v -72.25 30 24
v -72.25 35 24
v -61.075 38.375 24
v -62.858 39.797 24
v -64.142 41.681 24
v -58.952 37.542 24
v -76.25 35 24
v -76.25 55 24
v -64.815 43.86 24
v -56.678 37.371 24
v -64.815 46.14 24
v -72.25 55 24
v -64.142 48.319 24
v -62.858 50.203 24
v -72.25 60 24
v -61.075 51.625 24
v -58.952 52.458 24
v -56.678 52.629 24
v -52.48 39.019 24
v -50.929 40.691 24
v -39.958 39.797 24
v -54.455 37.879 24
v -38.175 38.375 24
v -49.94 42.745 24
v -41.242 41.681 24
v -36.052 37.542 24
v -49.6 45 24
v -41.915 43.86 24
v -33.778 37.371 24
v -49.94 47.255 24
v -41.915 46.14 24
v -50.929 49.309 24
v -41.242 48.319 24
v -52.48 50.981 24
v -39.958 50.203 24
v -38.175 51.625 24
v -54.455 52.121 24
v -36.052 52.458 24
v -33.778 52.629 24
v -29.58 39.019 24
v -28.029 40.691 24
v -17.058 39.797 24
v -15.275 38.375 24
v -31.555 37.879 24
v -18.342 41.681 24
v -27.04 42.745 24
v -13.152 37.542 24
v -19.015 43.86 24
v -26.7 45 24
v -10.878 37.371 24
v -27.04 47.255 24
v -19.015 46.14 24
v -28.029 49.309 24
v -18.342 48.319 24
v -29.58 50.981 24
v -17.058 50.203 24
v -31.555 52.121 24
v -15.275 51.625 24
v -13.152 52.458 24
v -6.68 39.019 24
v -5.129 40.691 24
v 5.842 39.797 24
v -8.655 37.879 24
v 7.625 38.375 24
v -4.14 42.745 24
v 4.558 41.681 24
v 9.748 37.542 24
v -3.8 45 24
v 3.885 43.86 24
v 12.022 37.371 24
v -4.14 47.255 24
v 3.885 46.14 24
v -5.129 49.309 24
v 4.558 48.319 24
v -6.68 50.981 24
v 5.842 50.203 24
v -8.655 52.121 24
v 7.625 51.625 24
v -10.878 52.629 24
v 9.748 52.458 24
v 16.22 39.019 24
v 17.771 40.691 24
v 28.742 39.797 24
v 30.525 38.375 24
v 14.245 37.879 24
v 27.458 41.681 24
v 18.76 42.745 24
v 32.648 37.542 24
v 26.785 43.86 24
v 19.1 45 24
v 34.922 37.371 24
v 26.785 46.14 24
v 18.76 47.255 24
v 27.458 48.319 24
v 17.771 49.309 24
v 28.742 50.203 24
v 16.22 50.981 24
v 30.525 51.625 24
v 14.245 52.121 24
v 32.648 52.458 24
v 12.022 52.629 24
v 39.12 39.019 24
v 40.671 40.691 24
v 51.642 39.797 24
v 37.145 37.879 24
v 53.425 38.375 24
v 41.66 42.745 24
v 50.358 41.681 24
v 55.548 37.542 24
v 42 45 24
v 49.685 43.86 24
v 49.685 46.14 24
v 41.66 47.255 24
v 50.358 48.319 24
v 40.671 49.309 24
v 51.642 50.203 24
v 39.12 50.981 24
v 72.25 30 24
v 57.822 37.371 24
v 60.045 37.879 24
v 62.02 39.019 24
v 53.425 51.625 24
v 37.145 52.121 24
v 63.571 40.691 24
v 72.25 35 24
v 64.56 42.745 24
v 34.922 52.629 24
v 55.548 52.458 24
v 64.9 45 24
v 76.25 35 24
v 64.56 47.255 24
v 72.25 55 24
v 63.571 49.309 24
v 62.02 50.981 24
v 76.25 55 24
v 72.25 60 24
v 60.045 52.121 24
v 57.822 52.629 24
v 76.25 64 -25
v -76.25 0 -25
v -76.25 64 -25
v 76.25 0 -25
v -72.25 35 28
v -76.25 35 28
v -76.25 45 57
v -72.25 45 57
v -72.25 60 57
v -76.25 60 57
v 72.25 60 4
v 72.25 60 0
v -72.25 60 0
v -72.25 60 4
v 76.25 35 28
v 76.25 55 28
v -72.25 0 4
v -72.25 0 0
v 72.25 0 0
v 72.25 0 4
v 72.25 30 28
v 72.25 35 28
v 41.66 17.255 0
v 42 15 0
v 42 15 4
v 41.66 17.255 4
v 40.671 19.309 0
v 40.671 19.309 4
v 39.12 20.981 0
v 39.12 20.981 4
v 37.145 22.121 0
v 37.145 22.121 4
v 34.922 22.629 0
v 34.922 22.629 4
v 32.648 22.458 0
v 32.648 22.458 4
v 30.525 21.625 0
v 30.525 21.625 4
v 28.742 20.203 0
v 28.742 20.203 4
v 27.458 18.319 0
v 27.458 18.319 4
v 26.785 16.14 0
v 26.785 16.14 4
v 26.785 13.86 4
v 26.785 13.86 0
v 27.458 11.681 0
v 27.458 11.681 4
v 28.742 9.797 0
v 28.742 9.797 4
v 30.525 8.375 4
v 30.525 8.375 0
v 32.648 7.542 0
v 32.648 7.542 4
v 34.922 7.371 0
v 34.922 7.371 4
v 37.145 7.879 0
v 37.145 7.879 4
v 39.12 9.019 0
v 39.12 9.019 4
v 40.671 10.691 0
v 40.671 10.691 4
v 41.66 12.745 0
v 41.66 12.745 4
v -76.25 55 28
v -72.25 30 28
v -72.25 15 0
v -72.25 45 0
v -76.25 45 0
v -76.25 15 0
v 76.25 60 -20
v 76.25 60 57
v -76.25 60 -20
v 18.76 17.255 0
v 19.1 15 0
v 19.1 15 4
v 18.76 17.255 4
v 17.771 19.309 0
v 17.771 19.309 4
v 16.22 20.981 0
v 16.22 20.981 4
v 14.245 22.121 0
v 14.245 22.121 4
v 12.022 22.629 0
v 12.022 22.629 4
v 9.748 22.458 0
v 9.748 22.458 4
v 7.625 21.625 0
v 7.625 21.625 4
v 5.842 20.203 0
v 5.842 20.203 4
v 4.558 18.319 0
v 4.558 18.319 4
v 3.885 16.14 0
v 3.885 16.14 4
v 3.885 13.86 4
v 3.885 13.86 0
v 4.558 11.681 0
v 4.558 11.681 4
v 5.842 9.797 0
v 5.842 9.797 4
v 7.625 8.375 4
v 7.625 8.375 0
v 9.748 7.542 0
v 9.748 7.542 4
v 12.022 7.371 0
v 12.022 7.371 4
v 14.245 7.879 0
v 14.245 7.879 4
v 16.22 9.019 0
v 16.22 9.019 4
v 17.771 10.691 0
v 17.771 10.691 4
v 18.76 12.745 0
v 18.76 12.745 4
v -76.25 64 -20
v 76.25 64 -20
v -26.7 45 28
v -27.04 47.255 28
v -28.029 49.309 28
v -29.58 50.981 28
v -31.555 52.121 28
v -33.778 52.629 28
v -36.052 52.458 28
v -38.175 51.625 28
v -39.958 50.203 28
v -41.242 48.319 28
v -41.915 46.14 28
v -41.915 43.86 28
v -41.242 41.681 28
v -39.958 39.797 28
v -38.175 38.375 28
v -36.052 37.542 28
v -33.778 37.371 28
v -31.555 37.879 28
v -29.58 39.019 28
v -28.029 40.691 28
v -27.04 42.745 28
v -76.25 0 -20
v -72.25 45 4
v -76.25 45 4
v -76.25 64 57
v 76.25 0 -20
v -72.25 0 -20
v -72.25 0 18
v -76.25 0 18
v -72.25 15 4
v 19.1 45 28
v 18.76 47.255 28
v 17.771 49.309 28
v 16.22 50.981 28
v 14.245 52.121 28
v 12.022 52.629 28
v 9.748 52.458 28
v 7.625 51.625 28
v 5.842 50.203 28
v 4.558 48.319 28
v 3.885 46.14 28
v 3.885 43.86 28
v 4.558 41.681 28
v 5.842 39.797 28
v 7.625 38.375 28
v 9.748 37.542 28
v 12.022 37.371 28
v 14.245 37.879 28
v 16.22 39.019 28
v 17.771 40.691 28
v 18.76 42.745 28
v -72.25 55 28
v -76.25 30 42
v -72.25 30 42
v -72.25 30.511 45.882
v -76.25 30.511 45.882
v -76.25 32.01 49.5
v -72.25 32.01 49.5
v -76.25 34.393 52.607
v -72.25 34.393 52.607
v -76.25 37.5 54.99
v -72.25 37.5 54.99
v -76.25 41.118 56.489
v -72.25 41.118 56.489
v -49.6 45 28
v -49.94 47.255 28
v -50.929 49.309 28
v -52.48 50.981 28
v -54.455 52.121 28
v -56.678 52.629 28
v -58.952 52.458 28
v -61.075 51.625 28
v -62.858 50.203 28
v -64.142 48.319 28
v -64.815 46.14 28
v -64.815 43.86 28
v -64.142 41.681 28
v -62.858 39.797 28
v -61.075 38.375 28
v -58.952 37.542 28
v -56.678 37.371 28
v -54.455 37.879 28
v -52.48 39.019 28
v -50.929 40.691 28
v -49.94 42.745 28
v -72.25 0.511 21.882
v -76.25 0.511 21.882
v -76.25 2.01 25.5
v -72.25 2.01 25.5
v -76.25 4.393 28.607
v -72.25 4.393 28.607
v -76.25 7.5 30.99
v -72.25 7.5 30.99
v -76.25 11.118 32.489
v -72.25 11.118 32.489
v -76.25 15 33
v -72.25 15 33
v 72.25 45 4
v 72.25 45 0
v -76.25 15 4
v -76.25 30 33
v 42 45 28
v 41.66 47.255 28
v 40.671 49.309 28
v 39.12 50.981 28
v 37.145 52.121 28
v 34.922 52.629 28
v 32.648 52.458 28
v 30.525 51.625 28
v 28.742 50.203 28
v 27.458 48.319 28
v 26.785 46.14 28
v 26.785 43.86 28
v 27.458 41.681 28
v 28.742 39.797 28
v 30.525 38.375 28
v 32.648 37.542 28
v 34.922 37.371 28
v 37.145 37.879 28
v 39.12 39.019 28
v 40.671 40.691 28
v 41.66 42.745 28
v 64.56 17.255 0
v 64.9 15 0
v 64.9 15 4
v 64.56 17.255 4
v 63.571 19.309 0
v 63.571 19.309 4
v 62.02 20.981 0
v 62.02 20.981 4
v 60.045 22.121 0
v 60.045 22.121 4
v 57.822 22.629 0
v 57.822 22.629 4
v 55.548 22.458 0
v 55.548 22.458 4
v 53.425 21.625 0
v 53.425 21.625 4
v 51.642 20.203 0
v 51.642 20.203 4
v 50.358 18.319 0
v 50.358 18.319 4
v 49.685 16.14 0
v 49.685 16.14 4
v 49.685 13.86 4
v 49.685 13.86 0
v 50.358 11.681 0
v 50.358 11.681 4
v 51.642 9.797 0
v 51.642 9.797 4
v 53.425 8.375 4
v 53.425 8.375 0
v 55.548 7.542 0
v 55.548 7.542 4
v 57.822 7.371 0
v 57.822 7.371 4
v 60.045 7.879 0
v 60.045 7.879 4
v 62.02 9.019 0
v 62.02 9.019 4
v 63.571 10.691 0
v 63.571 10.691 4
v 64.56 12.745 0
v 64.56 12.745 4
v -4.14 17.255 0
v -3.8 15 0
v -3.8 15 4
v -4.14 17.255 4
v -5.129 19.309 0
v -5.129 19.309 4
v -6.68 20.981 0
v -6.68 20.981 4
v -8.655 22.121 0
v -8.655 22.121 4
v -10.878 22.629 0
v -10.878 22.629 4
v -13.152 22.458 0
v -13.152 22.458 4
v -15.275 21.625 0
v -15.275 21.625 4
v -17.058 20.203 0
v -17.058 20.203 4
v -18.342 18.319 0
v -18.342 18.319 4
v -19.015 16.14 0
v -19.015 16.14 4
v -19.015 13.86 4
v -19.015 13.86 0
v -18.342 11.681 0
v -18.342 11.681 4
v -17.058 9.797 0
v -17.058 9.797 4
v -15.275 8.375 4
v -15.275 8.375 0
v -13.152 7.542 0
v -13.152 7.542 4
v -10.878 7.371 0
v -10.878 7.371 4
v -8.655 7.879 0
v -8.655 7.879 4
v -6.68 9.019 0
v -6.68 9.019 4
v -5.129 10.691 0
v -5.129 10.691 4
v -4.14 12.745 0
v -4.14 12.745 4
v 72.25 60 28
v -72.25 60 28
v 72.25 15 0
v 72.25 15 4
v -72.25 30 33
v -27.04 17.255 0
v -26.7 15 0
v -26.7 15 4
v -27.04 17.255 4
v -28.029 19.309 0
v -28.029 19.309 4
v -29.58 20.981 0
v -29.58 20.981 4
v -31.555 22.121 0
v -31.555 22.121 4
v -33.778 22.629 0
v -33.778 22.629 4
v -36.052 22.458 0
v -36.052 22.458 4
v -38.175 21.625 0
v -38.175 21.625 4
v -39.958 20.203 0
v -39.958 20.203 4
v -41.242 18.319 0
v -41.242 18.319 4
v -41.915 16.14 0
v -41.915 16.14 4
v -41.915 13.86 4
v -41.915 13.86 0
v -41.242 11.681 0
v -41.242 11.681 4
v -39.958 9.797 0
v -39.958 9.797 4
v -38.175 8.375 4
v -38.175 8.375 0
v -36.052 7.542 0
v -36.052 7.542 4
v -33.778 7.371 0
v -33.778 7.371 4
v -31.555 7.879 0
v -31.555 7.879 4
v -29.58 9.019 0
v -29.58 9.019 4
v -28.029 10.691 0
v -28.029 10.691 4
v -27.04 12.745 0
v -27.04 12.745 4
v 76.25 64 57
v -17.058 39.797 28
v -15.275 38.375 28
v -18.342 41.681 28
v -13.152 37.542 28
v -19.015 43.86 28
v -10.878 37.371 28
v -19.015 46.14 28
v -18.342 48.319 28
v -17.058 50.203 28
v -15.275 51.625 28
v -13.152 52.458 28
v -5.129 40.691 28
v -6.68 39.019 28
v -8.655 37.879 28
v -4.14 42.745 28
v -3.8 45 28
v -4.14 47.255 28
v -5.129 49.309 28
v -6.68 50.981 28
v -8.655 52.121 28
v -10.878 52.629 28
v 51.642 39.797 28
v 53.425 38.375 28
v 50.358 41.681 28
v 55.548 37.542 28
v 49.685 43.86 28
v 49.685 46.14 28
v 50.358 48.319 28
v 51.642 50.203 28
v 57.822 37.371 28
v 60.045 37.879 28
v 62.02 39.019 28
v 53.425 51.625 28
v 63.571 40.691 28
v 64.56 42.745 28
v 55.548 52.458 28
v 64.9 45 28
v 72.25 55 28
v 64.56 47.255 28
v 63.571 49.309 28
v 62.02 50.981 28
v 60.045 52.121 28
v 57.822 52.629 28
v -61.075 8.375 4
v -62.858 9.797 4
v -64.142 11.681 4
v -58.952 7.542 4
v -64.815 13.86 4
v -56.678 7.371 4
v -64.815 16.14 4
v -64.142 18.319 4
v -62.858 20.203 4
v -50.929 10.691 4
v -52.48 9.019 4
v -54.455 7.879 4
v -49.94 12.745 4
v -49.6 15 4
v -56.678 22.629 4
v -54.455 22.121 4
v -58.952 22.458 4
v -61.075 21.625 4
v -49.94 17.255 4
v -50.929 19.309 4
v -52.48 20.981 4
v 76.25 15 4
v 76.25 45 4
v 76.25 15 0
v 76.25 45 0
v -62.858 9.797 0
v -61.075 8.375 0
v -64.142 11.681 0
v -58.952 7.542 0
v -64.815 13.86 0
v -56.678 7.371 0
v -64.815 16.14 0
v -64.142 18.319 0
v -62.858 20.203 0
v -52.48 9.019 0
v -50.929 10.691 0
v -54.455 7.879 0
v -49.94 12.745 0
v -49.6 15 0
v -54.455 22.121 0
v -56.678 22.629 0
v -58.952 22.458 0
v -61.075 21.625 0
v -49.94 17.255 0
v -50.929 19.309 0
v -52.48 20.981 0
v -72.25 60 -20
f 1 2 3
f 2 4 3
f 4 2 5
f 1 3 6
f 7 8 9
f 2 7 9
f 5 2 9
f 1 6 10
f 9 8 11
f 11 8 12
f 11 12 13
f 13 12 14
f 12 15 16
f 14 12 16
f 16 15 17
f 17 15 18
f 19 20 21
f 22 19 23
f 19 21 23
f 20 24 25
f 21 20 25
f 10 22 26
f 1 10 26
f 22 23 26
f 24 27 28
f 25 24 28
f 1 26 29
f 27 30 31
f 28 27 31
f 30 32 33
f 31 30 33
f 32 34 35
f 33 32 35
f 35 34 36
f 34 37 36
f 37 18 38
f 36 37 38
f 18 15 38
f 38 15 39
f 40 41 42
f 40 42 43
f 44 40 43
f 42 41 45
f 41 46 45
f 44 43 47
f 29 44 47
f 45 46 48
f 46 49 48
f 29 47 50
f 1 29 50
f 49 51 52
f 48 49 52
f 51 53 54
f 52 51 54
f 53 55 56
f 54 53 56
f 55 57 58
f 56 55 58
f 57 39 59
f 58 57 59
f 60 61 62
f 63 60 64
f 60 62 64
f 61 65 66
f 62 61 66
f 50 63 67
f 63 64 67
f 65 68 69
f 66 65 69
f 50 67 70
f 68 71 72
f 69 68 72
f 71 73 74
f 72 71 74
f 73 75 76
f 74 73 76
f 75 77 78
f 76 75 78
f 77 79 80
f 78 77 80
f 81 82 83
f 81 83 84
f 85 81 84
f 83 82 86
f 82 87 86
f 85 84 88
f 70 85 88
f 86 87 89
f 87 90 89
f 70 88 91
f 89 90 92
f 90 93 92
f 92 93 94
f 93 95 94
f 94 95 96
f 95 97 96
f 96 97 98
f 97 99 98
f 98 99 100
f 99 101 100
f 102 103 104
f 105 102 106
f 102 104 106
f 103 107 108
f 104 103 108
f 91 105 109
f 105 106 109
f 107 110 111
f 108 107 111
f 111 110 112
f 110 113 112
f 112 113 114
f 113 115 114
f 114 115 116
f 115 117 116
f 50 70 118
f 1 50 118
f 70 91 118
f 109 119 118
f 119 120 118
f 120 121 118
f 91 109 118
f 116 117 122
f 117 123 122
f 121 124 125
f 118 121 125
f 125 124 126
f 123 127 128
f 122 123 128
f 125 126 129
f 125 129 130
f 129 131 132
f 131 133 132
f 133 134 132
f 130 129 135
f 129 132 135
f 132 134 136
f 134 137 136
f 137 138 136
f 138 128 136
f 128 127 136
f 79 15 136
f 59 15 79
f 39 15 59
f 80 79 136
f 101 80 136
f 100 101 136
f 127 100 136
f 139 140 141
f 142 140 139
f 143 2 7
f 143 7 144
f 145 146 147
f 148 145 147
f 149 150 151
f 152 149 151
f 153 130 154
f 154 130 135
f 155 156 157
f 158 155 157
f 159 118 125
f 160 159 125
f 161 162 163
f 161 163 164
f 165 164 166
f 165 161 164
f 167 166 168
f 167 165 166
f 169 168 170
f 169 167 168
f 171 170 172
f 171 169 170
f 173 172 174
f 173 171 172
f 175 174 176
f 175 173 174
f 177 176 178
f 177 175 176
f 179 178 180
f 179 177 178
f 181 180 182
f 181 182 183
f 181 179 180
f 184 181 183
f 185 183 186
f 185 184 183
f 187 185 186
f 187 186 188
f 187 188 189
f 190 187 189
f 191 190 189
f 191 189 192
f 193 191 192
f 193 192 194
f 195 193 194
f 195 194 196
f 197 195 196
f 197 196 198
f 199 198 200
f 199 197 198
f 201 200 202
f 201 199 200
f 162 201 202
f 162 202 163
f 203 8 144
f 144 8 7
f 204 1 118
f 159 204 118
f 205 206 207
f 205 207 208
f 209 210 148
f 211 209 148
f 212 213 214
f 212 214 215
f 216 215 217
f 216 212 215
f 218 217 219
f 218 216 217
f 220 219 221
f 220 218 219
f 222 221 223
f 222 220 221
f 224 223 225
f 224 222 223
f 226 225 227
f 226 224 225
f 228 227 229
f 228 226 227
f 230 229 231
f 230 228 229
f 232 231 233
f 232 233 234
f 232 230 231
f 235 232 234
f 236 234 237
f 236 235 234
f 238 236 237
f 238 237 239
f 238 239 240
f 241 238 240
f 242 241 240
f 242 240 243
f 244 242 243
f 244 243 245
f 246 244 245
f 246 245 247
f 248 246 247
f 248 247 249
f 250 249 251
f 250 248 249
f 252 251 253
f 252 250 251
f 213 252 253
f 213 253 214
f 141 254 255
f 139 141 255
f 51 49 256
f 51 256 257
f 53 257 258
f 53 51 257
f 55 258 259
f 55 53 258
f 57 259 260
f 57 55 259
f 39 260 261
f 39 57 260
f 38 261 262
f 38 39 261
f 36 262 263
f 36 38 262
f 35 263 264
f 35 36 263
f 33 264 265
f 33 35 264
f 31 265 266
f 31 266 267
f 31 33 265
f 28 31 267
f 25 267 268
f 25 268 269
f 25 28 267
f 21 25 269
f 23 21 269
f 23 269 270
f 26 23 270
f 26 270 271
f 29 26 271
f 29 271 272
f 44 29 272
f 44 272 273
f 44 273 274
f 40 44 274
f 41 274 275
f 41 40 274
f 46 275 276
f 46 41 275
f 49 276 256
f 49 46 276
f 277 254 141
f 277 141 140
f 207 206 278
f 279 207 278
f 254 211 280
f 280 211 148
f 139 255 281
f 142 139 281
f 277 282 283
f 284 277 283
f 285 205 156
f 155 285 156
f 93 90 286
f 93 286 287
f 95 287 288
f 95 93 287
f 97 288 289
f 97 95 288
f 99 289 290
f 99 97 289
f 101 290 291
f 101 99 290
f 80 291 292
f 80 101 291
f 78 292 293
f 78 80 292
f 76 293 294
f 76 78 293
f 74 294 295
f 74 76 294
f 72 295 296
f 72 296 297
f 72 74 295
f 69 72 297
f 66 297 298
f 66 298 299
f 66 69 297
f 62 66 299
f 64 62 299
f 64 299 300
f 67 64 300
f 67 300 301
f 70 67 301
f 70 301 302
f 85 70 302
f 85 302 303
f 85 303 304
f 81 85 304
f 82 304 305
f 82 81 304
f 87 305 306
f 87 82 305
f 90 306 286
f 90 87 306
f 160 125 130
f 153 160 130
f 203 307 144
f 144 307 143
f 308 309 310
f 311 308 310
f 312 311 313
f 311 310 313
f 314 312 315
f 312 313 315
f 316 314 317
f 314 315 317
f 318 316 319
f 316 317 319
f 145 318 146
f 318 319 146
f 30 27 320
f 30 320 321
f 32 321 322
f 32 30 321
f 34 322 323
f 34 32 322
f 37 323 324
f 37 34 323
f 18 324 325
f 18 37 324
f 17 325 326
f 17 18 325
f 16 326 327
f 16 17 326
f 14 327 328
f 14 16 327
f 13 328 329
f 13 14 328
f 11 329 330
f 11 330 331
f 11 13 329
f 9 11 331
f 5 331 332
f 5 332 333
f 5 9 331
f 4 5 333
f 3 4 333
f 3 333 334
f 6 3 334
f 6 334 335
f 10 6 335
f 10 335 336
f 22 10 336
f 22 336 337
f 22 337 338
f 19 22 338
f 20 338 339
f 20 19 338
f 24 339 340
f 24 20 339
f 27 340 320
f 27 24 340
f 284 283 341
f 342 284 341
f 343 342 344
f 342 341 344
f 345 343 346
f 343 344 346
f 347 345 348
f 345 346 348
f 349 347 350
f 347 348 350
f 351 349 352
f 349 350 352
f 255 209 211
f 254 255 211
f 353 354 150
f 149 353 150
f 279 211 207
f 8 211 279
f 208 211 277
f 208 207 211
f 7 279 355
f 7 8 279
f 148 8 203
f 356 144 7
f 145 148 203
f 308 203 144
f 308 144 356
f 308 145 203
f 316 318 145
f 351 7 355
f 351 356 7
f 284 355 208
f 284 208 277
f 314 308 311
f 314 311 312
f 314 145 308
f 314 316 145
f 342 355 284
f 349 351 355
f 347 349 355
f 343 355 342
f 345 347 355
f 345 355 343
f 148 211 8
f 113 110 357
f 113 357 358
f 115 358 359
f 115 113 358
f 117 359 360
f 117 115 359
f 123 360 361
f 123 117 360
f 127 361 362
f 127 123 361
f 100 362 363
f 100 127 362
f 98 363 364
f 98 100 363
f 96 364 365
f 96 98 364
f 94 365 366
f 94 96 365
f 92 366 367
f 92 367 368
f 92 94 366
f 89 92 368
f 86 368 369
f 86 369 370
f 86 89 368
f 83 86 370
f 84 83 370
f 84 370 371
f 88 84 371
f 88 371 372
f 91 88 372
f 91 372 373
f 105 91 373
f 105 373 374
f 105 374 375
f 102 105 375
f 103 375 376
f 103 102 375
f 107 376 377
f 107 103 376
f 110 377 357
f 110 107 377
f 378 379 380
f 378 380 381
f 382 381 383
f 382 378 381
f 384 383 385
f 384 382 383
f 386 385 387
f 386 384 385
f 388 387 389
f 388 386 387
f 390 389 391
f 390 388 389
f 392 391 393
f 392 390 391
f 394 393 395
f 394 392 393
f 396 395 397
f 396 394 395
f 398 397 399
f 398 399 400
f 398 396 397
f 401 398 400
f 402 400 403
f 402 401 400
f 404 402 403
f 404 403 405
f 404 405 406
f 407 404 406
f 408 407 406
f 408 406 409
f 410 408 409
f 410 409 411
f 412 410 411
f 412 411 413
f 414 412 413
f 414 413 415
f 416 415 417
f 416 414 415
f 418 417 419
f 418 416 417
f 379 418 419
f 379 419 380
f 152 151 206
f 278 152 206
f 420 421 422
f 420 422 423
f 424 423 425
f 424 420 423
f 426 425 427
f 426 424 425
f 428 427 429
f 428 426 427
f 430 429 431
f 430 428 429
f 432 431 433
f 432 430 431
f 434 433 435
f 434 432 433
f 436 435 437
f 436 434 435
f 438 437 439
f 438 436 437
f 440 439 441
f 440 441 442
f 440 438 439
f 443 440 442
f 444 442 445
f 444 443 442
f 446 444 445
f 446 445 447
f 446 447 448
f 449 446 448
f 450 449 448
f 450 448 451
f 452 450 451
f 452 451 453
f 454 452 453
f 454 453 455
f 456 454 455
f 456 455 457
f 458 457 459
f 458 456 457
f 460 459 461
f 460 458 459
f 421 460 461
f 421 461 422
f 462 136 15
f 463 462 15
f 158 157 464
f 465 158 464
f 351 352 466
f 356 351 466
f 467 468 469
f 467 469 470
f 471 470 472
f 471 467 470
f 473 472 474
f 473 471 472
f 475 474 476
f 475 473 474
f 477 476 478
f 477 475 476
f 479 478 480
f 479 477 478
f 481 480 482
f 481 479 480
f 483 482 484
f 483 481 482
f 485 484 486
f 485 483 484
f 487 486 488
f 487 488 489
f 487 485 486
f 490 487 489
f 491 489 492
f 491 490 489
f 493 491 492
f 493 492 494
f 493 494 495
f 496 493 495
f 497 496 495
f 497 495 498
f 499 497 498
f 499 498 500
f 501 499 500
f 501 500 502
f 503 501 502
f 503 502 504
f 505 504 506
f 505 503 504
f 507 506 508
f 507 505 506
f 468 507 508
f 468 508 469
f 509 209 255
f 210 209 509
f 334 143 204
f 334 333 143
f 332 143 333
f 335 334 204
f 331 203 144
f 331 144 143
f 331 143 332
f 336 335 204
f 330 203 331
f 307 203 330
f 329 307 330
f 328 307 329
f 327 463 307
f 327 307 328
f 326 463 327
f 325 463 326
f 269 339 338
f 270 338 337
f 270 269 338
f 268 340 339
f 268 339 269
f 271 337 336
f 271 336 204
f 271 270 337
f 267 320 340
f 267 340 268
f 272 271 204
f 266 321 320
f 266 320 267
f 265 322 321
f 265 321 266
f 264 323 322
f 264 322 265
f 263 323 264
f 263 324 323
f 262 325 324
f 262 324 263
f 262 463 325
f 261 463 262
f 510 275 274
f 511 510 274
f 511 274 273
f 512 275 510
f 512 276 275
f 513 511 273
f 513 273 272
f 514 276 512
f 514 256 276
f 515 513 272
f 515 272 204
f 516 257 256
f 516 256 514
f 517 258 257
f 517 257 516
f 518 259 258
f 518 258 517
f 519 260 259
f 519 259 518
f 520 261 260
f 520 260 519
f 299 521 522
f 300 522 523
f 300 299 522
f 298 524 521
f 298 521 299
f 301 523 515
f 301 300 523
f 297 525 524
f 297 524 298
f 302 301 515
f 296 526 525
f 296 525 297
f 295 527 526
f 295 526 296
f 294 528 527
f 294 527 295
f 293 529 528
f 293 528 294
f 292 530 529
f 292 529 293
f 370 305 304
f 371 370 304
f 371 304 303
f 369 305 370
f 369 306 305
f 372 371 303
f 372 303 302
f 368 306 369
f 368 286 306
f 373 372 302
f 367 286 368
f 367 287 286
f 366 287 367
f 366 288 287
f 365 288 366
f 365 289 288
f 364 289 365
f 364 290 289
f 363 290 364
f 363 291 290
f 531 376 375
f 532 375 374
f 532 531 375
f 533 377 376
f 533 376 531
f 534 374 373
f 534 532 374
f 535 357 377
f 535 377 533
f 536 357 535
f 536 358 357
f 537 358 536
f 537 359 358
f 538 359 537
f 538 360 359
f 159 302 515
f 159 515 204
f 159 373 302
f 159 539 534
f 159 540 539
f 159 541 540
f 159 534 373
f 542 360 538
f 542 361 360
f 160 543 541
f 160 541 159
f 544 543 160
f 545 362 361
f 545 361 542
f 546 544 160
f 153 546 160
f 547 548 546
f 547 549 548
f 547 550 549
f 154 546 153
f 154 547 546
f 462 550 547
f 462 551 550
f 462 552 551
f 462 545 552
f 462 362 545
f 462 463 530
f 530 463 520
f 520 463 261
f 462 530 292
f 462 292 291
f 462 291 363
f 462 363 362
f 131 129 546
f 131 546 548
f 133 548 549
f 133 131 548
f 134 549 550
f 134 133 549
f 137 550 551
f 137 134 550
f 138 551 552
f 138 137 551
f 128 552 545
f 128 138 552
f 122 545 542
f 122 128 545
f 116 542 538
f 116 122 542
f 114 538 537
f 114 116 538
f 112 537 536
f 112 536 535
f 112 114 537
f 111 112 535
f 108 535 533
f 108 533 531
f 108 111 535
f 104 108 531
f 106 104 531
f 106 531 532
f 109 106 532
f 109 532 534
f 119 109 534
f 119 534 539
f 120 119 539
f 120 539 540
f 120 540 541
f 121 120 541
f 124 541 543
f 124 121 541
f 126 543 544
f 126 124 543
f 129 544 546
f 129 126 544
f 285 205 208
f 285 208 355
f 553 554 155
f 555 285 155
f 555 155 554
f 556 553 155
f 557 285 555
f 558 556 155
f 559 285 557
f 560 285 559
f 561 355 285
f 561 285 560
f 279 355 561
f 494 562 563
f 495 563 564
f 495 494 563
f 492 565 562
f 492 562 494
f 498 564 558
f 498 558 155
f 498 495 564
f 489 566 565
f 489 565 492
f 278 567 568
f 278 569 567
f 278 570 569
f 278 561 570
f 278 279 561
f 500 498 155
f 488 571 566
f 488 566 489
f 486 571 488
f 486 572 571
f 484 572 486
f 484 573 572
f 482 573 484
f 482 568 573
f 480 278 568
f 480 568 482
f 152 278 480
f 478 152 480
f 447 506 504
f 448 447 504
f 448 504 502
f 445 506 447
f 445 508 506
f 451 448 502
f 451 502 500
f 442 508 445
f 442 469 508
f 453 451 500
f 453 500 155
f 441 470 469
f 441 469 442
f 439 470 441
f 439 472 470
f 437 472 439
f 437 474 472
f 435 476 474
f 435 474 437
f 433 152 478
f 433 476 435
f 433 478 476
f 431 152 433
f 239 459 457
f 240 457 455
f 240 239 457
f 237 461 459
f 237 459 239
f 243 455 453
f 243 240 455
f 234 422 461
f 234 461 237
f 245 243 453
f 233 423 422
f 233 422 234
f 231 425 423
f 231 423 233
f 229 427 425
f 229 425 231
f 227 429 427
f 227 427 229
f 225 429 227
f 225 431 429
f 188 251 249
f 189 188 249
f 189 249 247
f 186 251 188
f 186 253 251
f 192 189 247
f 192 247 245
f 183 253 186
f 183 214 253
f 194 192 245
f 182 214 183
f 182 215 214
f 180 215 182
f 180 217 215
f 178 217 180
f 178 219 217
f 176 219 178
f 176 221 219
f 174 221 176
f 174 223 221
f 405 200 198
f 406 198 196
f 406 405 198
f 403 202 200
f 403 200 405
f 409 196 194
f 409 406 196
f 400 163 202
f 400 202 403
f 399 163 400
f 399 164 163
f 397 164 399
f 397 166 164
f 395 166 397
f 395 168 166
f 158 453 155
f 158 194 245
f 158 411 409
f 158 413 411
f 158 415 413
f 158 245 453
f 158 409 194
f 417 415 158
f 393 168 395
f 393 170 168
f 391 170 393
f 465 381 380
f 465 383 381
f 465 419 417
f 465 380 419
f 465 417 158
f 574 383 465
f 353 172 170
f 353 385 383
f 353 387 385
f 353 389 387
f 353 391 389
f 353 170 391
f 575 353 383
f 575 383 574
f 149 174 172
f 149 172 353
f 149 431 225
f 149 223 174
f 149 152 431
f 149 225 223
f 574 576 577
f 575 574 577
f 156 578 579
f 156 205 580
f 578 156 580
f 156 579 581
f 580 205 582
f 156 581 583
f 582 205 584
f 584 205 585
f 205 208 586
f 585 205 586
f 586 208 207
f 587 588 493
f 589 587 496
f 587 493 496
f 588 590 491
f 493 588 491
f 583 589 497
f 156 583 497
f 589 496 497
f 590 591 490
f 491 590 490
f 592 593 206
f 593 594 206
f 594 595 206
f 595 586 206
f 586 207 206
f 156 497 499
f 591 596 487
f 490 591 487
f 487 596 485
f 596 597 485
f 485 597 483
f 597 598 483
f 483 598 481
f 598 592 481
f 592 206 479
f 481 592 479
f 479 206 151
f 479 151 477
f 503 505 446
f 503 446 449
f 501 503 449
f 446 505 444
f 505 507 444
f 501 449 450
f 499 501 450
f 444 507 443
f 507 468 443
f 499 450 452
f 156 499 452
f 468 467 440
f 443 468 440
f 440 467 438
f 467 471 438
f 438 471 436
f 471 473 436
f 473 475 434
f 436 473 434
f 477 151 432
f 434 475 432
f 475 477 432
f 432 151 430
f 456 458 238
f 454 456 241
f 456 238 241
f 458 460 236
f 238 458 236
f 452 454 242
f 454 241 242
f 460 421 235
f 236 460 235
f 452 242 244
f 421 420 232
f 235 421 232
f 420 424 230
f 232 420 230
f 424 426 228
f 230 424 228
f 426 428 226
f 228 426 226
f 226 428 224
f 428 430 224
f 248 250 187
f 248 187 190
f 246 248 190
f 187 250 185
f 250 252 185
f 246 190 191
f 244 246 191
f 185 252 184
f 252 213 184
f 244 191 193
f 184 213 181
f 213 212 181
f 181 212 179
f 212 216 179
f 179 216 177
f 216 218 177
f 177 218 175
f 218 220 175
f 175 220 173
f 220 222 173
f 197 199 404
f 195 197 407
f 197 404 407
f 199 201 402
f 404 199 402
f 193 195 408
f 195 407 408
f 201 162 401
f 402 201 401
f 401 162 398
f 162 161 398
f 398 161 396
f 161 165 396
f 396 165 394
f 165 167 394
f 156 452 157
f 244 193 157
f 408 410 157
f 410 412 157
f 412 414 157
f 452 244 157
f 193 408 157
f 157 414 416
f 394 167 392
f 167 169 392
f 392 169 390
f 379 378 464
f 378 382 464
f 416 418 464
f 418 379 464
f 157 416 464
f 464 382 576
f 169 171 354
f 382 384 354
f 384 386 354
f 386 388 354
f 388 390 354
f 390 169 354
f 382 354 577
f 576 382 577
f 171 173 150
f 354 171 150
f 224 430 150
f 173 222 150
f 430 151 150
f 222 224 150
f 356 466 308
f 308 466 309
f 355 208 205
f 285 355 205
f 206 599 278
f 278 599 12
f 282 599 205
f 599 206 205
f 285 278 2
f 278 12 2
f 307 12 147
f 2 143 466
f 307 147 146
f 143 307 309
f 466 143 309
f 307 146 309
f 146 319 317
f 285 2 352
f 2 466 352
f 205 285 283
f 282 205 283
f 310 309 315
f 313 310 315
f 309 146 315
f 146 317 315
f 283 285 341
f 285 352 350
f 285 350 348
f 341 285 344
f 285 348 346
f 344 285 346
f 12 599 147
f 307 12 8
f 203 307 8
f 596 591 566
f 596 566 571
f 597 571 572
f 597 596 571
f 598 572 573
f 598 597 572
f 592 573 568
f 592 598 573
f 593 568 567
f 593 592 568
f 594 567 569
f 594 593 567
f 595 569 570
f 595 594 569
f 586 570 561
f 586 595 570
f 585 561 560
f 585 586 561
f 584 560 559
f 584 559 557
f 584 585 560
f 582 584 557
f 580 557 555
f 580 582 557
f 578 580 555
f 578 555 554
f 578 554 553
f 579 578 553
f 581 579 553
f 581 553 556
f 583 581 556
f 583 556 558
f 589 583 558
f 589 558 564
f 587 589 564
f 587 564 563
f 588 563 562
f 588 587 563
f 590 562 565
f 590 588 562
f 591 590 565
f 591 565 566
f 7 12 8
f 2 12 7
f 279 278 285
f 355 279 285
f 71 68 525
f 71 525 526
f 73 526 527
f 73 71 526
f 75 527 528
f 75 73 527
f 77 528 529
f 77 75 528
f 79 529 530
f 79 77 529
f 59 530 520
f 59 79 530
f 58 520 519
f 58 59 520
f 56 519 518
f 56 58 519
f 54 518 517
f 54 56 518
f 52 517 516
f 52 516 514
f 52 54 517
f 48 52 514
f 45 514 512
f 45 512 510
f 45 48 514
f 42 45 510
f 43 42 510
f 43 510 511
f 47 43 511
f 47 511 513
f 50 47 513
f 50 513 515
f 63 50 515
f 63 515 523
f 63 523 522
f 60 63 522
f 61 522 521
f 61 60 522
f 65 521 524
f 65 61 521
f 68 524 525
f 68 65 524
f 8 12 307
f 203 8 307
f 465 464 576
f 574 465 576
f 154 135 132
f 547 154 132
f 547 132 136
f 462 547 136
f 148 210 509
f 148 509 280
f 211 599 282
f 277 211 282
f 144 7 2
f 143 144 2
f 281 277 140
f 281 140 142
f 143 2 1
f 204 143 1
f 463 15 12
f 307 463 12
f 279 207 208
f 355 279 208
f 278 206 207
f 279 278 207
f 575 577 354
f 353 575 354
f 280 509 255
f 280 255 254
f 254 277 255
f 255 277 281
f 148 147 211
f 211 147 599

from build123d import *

# Parameters (mm, degrees)
F0_R      = 7.65
F1_DEPTH  = 4
F2_W      = 30
F2_H      = 4
F2_W_2    = 20
F3_DEPTH  = 4
F5_R      = 7.65
F6_DEPTH  = 4
F7_W      = 152.5
F7_H      = 77
F8_DEPTH  = 4
F9_W      = 152.5
F9_H      = 64
F10_DEPTH = 5


with BuildPart() as f1:
    # F0 (on Top) → F1 (new body)
    with BuildSketch(Plane.XY):
        Polygon((72.25, 60), (-72.25, 60), (-72.25, 45), (-76.25, 45), (-76.25, 15), (-72.25, 15), (-72.25, 0), (72.25, 0), (72.25, 15), (76.25, 15), (76.25, 45), (72.25, 45), align=None)
        with Locations((-57.25, 15)):
            Circle(F0_R, mode=Mode.SUBTRACT)
        with Locations((-34.35, 15)):
            Circle(F0_R, mode=Mode.SUBTRACT)
        with Locations((-11.45, 15)):
            Circle(F0_R, mode=Mode.SUBTRACT)
        with Locations((11.45, 15)):
            Circle(F0_R, mode=Mode.SUBTRACT)
        with Locations((34.35, 15)):
            Circle(F0_R, mode=Mode.SUBTRACT)
        with Locations((57.25, 15)):
            Circle(F0_R, mode=Mode.SUBTRACT)
    extrude(amount=F1_DEPTH)


with BuildPart() as f3:
    # F2 (on face) → F3 (new body)
    with BuildSketch(Plane(origin=(-72.25, 0, 0), x_dir=(0, -1, 0), z_dir=(-1, 0, 0))):
        with BuildLine():
            Line((-60, 33), (-60, -20))
            Line((-60, -20), (0, -20))
            Line((0, -20), (0, 18))
            ThreePointArc((0, 18), (-4.3933982822, 28.6066017178), (-15, 33))
            Line((-15, 33), (-30, 33))
            Line((-30, 33), (-30, 42))
            ThreePointArc((-30, 42), (-34.3933982822, 52.6066017178), (-45, 57))
            Line((-45, 57), (-60, 57))
            Line((-60, 57), (-60, 33))
        make_face()
        with Locations((-30, 2)):
            Rectangle(F2_W, F2_H, mode=Mode.SUBTRACT)
        with Locations((-45, 26)):
            Rectangle(F2_W_2, F2_H, mode=Mode.SUBTRACT)
    extrude(amount=F3_DEPTH)


with BuildPart() as f6:
    # F5 (on offset) → F6 (new body)
    with BuildSketch(Plane.XY.offset(24)):
        Polygon((72.25, 60), (-72.25, 60), (-72.25, 55), (-76.25, 55), (-76.25, 35), (-72.25, 35), (-72.25, 30), (72.25, 30), (72.25, 35), (76.25, 35), (76.25, 55), (72.25, 55), align=None)
        with Locations((-57.25, 45)):
            Circle(F5_R, mode=Mode.SUBTRACT)
        with Locations((-34.35, 45)):
            Circle(F5_R, mode=Mode.SUBTRACT)
        with Locations((-11.45, 45)):
            Circle(F5_R, mode=Mode.SUBTRACT)
        with Locations((11.45, 45)):
            Circle(F5_R, mode=Mode.SUBTRACT)
        with Locations((34.35, 45)):
            Circle(F5_R, mode=Mode.SUBTRACT)
        with Locations((57.25, 45)):
            Circle(F5_R, mode=Mode.SUBTRACT)
    extrude(amount=F6_DEPTH)


with BuildPart() as f8:
    # F7 (on face) → F8 (new body)
    with BuildSketch(Plane(origin=(0, 60, 0), x_dir=(-1, 0, 0), z_dir=(0, 1, 0))):
        with Locations((0, 18.5)):
            Rectangle(F7_W, F7_H)
    extrude(amount=F8_DEPTH)


with BuildPart() as f10:
    # F9 (on face) → F10 (new body)
    with BuildSketch(Plane(origin=(0, 0, -20), x_dir=(1, 0, 0), z_dir=(0, 0, -1))):
        with Locations((0, -32)):
            Rectangle(F9_W, F9_H)
    extrude(amount=F10_DEPTH)


solid = Compound([f1.part, f3.part, f6.part, f8.part, f10.part])
